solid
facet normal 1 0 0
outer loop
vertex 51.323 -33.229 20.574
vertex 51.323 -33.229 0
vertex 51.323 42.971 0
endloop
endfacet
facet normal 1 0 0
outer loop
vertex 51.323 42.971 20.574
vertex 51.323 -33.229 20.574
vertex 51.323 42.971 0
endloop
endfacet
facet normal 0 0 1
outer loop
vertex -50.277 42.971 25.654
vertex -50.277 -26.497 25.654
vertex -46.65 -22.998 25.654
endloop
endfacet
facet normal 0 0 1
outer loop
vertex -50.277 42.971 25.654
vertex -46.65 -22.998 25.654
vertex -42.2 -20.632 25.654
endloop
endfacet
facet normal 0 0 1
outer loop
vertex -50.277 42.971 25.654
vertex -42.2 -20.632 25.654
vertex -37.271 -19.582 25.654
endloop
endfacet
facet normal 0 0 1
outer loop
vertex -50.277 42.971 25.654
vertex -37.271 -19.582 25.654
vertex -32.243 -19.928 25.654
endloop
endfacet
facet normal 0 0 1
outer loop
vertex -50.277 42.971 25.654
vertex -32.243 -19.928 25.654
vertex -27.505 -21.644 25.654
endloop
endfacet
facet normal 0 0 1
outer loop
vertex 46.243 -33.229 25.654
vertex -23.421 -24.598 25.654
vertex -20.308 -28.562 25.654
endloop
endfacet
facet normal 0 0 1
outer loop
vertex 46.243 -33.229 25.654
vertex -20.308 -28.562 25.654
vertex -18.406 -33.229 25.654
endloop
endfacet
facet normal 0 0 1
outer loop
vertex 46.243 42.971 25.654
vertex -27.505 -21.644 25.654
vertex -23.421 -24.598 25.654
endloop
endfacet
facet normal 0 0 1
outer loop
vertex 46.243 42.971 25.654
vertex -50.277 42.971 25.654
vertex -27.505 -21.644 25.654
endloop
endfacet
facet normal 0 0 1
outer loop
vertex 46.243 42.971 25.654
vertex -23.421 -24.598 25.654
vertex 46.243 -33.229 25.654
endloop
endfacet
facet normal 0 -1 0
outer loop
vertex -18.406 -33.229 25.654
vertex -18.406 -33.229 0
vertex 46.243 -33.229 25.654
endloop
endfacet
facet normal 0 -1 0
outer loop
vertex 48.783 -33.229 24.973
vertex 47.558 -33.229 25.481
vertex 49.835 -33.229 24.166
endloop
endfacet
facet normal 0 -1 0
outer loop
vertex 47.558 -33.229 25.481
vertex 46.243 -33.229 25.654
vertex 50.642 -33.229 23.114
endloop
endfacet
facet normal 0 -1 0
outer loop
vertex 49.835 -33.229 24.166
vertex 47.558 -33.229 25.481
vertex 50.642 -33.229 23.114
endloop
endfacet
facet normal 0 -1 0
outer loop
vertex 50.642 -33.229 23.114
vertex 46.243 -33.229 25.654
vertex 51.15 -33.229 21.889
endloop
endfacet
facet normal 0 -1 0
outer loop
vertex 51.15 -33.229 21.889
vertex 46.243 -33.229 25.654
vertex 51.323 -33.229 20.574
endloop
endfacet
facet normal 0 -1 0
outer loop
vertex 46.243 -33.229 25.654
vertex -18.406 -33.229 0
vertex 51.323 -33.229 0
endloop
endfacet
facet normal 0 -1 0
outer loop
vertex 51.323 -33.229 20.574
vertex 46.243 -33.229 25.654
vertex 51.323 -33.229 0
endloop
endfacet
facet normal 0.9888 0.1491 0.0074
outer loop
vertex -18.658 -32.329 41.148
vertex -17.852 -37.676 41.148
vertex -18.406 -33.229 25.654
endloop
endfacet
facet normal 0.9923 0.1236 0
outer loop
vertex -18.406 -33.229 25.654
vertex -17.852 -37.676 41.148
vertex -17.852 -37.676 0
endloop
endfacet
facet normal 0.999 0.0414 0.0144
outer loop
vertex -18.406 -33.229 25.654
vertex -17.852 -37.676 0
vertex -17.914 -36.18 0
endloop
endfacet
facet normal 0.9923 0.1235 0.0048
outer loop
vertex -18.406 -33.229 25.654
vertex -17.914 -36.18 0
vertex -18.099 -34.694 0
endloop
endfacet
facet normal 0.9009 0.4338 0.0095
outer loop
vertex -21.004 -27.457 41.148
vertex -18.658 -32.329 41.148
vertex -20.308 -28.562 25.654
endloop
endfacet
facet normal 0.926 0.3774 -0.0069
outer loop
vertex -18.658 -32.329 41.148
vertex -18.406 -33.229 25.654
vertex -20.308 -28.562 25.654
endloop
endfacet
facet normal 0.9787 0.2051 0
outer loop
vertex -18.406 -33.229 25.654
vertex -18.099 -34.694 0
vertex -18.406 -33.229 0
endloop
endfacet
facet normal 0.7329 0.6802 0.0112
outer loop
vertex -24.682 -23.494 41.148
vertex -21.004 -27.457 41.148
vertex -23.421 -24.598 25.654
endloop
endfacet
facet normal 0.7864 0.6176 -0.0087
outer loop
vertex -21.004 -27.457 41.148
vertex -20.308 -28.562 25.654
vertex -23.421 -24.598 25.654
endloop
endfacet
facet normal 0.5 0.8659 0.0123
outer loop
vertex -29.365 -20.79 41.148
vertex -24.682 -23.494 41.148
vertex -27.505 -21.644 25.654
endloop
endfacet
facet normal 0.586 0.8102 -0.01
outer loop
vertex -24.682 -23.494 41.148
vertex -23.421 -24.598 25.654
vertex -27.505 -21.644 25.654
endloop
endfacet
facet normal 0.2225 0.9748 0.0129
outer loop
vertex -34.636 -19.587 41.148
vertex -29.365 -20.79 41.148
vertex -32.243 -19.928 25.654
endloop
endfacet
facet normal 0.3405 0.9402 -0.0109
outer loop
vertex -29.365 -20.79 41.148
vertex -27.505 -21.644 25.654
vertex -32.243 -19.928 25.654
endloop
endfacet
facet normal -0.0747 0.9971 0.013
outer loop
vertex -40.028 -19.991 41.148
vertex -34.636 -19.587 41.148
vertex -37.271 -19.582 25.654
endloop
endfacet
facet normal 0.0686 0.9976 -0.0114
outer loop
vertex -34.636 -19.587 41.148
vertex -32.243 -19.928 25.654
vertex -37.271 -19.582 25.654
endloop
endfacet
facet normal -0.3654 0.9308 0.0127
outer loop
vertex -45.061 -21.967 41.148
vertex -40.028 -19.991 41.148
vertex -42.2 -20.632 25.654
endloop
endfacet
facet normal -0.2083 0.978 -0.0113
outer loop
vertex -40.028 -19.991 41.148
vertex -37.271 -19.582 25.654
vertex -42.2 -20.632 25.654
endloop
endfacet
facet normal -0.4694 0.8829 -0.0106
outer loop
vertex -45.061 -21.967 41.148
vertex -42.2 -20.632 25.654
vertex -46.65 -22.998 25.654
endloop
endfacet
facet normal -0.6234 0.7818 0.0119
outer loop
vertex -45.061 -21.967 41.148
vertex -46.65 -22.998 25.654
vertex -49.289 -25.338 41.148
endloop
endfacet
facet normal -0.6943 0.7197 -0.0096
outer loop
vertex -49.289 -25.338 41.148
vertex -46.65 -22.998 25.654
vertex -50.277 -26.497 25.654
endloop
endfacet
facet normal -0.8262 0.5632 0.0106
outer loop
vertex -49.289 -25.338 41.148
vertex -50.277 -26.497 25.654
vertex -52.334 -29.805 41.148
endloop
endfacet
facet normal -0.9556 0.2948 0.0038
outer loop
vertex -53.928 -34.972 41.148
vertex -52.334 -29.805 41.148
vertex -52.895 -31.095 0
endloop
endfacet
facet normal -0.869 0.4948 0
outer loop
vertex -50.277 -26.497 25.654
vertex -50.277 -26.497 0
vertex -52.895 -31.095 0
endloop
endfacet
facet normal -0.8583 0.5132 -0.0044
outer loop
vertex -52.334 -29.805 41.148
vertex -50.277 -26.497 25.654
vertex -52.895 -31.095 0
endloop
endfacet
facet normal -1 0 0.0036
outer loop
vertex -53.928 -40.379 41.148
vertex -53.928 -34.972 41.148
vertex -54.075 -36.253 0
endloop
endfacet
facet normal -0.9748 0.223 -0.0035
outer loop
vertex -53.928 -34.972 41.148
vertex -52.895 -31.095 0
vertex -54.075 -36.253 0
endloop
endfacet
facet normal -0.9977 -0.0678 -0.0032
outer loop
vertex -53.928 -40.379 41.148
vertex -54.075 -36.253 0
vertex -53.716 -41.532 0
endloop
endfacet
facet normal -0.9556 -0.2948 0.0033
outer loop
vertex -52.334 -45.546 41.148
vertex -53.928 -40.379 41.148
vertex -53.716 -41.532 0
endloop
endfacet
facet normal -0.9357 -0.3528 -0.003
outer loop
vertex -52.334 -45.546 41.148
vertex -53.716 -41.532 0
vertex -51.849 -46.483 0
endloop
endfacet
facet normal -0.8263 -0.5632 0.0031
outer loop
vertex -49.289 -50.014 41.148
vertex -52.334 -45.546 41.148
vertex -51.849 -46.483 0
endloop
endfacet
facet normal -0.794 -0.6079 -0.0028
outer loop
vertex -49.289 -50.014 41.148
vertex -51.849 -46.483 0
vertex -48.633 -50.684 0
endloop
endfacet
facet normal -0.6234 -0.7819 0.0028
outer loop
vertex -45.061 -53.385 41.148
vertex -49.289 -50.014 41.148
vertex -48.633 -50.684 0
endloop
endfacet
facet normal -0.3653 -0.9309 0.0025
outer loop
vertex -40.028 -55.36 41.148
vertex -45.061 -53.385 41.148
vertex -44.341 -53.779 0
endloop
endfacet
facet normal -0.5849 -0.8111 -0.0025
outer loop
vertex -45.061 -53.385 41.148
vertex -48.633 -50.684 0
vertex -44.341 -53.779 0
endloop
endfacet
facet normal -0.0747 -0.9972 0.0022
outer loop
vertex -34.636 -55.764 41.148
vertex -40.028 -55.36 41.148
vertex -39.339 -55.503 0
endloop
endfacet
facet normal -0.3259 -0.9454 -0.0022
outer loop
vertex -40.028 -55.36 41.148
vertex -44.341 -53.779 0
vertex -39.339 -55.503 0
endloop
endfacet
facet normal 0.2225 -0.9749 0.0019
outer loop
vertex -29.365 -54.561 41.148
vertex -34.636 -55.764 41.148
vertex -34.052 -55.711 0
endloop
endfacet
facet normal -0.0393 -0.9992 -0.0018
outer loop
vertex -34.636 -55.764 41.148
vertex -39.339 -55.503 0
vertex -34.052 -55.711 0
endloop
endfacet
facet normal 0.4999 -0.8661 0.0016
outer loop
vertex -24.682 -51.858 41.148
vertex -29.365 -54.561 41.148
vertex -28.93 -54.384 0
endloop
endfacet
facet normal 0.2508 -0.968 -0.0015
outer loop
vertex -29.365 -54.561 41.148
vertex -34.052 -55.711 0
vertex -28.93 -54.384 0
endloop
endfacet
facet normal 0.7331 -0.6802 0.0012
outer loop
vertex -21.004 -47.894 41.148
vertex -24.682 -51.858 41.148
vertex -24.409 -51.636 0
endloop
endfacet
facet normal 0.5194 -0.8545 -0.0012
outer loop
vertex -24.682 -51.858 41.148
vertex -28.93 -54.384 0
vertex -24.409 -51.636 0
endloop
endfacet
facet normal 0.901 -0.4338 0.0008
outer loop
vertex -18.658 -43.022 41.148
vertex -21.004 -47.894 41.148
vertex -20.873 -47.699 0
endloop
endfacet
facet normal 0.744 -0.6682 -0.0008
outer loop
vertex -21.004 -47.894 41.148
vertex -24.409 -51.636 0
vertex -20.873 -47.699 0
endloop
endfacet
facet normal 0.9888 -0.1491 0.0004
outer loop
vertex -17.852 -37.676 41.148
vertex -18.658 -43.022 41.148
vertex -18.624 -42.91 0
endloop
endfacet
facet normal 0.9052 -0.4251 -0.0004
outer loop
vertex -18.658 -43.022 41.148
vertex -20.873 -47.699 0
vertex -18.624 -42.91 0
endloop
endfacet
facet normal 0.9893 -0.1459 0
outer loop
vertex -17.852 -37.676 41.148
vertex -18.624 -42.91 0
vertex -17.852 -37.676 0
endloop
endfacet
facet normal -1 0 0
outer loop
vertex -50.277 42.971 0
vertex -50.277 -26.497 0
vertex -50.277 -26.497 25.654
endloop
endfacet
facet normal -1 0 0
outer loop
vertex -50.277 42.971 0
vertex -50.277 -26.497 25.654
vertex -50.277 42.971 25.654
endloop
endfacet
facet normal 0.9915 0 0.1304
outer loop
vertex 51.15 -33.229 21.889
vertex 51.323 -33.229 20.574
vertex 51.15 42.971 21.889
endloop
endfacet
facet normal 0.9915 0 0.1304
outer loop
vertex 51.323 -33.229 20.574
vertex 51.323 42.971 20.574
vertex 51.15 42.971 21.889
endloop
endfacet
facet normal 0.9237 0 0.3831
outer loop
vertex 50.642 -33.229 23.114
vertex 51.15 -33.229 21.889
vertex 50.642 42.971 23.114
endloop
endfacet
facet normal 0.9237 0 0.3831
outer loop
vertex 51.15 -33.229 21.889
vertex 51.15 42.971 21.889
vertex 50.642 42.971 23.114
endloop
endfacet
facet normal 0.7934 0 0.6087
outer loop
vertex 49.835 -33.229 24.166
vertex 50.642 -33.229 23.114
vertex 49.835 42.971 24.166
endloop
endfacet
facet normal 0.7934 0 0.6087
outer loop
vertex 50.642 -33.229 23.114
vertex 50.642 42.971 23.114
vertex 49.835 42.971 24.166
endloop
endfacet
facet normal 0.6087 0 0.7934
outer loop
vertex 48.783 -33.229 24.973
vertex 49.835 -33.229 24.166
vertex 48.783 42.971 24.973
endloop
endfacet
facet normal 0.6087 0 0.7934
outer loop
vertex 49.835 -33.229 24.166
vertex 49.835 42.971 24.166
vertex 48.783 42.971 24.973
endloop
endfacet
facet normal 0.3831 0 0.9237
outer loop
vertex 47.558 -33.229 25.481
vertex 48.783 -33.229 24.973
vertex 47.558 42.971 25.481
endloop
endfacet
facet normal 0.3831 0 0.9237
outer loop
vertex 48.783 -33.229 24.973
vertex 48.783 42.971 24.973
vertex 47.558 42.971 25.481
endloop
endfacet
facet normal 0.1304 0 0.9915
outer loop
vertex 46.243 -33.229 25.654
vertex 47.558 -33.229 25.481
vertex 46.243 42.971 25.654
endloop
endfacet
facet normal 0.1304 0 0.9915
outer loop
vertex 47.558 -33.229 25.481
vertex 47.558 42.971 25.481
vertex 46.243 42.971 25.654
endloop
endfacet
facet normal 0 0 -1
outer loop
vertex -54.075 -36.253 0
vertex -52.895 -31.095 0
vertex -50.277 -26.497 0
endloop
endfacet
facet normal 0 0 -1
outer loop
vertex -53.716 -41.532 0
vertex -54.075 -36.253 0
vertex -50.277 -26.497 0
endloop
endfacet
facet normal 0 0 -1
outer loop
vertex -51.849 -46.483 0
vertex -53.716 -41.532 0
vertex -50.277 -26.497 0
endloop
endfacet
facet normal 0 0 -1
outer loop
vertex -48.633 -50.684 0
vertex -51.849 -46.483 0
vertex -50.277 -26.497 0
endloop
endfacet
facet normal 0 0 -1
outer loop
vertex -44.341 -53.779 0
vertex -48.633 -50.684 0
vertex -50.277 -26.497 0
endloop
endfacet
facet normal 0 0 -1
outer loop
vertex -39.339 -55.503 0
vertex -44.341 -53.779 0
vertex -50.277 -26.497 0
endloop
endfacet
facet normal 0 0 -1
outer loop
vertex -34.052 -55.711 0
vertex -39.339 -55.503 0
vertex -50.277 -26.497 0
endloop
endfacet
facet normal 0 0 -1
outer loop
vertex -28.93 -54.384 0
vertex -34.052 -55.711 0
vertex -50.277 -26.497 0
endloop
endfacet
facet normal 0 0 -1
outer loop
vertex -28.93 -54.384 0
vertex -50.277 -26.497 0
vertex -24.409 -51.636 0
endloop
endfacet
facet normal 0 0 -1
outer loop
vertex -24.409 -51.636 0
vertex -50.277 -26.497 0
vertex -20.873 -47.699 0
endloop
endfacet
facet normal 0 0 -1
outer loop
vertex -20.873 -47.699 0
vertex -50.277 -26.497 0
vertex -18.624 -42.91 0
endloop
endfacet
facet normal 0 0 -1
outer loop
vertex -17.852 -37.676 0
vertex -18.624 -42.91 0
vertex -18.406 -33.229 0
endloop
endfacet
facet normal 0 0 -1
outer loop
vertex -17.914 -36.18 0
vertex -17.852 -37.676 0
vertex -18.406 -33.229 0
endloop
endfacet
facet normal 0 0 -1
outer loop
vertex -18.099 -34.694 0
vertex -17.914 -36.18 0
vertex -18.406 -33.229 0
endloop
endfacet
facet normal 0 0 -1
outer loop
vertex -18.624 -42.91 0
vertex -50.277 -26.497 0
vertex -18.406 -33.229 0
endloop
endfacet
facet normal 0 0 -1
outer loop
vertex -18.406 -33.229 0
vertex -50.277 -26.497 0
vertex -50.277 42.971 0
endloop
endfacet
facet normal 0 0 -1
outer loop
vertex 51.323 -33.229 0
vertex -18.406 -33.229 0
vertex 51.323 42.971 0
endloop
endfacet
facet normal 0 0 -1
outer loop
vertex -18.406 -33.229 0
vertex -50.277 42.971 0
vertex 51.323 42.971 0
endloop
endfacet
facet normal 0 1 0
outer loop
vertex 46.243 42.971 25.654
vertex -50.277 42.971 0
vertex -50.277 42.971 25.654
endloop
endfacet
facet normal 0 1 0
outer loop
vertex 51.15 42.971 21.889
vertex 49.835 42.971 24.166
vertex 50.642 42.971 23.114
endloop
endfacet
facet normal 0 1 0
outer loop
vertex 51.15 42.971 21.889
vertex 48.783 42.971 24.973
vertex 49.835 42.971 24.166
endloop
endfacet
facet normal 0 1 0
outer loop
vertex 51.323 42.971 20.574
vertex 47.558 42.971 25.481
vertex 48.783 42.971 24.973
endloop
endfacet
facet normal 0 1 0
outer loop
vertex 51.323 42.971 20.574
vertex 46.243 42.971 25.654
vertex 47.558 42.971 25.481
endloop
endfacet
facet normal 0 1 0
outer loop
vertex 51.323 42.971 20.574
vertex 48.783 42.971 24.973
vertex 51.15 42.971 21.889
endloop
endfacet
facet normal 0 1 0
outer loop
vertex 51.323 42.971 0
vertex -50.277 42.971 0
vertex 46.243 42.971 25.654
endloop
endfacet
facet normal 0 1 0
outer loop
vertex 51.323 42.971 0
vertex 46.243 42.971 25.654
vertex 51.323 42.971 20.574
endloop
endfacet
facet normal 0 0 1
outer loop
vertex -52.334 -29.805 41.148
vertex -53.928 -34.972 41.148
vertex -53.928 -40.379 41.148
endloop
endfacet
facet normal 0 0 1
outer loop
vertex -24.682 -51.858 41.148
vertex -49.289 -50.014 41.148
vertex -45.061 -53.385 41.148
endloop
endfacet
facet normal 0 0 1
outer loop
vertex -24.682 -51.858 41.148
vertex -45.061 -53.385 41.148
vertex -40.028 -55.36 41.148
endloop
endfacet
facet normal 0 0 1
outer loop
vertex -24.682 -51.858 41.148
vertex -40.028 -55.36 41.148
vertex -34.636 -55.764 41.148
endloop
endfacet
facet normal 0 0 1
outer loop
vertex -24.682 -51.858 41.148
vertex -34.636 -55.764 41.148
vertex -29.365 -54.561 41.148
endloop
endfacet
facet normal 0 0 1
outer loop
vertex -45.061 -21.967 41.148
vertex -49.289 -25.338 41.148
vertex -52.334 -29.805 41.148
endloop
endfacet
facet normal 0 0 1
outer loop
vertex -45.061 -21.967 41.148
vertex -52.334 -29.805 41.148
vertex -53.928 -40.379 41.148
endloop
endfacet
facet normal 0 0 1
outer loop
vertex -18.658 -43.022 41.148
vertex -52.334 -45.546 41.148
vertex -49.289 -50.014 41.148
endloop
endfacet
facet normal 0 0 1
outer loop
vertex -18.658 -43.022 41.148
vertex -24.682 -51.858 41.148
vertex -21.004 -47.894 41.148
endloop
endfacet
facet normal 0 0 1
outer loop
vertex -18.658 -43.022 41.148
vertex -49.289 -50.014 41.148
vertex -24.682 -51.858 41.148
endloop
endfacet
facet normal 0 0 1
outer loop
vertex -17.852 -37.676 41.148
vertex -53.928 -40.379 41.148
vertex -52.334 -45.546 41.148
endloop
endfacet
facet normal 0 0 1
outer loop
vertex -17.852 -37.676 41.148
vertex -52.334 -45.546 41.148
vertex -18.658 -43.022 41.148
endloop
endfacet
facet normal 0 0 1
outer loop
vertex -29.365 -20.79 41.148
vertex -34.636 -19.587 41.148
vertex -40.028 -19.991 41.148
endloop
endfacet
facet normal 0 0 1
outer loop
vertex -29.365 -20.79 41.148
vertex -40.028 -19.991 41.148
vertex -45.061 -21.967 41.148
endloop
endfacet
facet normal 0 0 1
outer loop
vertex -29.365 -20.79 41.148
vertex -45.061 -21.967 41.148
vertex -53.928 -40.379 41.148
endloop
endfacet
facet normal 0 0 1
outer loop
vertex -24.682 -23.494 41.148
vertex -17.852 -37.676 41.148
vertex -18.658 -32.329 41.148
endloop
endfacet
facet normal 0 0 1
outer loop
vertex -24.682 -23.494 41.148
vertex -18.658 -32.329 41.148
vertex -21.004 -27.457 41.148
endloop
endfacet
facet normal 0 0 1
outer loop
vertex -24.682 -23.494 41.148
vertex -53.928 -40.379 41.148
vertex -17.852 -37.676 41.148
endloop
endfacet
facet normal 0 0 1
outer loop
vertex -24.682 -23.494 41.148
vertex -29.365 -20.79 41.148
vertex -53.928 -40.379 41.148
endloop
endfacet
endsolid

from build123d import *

# Parameters (mm, degrees)
F0_W     = 101.6
F0_H     = 76.2
F1_DEPTH = 25.654
F2_R     = 5.08
F3_R     = 18.139264
F4_DEPTH = 41.148


with BuildPart() as f1:
    # F0 (on Top) → F1 (new body)
    with BuildSketch(Plane.XY):
        with Locations((0.522892, 4.871118)):
            Rectangle(F0_W, F0_H)
    extrude(amount=F1_DEPTH)

    # F2
    f2_edges = [f1.edges().sort_by_distance(p)[0] for p in [
        (51.322892, 4.871118, 25.654),
    ]]
    fillet(f2_edges, radius=F2_R)

    # F3 (on Top) → F4 (join)
    with BuildSketch(Plane.XY):
        with Locations((-35.991579, -37.675709)):
            Circle(F3_R)
    extrude(amount=F4_DEPTH)


solid = f1.part
